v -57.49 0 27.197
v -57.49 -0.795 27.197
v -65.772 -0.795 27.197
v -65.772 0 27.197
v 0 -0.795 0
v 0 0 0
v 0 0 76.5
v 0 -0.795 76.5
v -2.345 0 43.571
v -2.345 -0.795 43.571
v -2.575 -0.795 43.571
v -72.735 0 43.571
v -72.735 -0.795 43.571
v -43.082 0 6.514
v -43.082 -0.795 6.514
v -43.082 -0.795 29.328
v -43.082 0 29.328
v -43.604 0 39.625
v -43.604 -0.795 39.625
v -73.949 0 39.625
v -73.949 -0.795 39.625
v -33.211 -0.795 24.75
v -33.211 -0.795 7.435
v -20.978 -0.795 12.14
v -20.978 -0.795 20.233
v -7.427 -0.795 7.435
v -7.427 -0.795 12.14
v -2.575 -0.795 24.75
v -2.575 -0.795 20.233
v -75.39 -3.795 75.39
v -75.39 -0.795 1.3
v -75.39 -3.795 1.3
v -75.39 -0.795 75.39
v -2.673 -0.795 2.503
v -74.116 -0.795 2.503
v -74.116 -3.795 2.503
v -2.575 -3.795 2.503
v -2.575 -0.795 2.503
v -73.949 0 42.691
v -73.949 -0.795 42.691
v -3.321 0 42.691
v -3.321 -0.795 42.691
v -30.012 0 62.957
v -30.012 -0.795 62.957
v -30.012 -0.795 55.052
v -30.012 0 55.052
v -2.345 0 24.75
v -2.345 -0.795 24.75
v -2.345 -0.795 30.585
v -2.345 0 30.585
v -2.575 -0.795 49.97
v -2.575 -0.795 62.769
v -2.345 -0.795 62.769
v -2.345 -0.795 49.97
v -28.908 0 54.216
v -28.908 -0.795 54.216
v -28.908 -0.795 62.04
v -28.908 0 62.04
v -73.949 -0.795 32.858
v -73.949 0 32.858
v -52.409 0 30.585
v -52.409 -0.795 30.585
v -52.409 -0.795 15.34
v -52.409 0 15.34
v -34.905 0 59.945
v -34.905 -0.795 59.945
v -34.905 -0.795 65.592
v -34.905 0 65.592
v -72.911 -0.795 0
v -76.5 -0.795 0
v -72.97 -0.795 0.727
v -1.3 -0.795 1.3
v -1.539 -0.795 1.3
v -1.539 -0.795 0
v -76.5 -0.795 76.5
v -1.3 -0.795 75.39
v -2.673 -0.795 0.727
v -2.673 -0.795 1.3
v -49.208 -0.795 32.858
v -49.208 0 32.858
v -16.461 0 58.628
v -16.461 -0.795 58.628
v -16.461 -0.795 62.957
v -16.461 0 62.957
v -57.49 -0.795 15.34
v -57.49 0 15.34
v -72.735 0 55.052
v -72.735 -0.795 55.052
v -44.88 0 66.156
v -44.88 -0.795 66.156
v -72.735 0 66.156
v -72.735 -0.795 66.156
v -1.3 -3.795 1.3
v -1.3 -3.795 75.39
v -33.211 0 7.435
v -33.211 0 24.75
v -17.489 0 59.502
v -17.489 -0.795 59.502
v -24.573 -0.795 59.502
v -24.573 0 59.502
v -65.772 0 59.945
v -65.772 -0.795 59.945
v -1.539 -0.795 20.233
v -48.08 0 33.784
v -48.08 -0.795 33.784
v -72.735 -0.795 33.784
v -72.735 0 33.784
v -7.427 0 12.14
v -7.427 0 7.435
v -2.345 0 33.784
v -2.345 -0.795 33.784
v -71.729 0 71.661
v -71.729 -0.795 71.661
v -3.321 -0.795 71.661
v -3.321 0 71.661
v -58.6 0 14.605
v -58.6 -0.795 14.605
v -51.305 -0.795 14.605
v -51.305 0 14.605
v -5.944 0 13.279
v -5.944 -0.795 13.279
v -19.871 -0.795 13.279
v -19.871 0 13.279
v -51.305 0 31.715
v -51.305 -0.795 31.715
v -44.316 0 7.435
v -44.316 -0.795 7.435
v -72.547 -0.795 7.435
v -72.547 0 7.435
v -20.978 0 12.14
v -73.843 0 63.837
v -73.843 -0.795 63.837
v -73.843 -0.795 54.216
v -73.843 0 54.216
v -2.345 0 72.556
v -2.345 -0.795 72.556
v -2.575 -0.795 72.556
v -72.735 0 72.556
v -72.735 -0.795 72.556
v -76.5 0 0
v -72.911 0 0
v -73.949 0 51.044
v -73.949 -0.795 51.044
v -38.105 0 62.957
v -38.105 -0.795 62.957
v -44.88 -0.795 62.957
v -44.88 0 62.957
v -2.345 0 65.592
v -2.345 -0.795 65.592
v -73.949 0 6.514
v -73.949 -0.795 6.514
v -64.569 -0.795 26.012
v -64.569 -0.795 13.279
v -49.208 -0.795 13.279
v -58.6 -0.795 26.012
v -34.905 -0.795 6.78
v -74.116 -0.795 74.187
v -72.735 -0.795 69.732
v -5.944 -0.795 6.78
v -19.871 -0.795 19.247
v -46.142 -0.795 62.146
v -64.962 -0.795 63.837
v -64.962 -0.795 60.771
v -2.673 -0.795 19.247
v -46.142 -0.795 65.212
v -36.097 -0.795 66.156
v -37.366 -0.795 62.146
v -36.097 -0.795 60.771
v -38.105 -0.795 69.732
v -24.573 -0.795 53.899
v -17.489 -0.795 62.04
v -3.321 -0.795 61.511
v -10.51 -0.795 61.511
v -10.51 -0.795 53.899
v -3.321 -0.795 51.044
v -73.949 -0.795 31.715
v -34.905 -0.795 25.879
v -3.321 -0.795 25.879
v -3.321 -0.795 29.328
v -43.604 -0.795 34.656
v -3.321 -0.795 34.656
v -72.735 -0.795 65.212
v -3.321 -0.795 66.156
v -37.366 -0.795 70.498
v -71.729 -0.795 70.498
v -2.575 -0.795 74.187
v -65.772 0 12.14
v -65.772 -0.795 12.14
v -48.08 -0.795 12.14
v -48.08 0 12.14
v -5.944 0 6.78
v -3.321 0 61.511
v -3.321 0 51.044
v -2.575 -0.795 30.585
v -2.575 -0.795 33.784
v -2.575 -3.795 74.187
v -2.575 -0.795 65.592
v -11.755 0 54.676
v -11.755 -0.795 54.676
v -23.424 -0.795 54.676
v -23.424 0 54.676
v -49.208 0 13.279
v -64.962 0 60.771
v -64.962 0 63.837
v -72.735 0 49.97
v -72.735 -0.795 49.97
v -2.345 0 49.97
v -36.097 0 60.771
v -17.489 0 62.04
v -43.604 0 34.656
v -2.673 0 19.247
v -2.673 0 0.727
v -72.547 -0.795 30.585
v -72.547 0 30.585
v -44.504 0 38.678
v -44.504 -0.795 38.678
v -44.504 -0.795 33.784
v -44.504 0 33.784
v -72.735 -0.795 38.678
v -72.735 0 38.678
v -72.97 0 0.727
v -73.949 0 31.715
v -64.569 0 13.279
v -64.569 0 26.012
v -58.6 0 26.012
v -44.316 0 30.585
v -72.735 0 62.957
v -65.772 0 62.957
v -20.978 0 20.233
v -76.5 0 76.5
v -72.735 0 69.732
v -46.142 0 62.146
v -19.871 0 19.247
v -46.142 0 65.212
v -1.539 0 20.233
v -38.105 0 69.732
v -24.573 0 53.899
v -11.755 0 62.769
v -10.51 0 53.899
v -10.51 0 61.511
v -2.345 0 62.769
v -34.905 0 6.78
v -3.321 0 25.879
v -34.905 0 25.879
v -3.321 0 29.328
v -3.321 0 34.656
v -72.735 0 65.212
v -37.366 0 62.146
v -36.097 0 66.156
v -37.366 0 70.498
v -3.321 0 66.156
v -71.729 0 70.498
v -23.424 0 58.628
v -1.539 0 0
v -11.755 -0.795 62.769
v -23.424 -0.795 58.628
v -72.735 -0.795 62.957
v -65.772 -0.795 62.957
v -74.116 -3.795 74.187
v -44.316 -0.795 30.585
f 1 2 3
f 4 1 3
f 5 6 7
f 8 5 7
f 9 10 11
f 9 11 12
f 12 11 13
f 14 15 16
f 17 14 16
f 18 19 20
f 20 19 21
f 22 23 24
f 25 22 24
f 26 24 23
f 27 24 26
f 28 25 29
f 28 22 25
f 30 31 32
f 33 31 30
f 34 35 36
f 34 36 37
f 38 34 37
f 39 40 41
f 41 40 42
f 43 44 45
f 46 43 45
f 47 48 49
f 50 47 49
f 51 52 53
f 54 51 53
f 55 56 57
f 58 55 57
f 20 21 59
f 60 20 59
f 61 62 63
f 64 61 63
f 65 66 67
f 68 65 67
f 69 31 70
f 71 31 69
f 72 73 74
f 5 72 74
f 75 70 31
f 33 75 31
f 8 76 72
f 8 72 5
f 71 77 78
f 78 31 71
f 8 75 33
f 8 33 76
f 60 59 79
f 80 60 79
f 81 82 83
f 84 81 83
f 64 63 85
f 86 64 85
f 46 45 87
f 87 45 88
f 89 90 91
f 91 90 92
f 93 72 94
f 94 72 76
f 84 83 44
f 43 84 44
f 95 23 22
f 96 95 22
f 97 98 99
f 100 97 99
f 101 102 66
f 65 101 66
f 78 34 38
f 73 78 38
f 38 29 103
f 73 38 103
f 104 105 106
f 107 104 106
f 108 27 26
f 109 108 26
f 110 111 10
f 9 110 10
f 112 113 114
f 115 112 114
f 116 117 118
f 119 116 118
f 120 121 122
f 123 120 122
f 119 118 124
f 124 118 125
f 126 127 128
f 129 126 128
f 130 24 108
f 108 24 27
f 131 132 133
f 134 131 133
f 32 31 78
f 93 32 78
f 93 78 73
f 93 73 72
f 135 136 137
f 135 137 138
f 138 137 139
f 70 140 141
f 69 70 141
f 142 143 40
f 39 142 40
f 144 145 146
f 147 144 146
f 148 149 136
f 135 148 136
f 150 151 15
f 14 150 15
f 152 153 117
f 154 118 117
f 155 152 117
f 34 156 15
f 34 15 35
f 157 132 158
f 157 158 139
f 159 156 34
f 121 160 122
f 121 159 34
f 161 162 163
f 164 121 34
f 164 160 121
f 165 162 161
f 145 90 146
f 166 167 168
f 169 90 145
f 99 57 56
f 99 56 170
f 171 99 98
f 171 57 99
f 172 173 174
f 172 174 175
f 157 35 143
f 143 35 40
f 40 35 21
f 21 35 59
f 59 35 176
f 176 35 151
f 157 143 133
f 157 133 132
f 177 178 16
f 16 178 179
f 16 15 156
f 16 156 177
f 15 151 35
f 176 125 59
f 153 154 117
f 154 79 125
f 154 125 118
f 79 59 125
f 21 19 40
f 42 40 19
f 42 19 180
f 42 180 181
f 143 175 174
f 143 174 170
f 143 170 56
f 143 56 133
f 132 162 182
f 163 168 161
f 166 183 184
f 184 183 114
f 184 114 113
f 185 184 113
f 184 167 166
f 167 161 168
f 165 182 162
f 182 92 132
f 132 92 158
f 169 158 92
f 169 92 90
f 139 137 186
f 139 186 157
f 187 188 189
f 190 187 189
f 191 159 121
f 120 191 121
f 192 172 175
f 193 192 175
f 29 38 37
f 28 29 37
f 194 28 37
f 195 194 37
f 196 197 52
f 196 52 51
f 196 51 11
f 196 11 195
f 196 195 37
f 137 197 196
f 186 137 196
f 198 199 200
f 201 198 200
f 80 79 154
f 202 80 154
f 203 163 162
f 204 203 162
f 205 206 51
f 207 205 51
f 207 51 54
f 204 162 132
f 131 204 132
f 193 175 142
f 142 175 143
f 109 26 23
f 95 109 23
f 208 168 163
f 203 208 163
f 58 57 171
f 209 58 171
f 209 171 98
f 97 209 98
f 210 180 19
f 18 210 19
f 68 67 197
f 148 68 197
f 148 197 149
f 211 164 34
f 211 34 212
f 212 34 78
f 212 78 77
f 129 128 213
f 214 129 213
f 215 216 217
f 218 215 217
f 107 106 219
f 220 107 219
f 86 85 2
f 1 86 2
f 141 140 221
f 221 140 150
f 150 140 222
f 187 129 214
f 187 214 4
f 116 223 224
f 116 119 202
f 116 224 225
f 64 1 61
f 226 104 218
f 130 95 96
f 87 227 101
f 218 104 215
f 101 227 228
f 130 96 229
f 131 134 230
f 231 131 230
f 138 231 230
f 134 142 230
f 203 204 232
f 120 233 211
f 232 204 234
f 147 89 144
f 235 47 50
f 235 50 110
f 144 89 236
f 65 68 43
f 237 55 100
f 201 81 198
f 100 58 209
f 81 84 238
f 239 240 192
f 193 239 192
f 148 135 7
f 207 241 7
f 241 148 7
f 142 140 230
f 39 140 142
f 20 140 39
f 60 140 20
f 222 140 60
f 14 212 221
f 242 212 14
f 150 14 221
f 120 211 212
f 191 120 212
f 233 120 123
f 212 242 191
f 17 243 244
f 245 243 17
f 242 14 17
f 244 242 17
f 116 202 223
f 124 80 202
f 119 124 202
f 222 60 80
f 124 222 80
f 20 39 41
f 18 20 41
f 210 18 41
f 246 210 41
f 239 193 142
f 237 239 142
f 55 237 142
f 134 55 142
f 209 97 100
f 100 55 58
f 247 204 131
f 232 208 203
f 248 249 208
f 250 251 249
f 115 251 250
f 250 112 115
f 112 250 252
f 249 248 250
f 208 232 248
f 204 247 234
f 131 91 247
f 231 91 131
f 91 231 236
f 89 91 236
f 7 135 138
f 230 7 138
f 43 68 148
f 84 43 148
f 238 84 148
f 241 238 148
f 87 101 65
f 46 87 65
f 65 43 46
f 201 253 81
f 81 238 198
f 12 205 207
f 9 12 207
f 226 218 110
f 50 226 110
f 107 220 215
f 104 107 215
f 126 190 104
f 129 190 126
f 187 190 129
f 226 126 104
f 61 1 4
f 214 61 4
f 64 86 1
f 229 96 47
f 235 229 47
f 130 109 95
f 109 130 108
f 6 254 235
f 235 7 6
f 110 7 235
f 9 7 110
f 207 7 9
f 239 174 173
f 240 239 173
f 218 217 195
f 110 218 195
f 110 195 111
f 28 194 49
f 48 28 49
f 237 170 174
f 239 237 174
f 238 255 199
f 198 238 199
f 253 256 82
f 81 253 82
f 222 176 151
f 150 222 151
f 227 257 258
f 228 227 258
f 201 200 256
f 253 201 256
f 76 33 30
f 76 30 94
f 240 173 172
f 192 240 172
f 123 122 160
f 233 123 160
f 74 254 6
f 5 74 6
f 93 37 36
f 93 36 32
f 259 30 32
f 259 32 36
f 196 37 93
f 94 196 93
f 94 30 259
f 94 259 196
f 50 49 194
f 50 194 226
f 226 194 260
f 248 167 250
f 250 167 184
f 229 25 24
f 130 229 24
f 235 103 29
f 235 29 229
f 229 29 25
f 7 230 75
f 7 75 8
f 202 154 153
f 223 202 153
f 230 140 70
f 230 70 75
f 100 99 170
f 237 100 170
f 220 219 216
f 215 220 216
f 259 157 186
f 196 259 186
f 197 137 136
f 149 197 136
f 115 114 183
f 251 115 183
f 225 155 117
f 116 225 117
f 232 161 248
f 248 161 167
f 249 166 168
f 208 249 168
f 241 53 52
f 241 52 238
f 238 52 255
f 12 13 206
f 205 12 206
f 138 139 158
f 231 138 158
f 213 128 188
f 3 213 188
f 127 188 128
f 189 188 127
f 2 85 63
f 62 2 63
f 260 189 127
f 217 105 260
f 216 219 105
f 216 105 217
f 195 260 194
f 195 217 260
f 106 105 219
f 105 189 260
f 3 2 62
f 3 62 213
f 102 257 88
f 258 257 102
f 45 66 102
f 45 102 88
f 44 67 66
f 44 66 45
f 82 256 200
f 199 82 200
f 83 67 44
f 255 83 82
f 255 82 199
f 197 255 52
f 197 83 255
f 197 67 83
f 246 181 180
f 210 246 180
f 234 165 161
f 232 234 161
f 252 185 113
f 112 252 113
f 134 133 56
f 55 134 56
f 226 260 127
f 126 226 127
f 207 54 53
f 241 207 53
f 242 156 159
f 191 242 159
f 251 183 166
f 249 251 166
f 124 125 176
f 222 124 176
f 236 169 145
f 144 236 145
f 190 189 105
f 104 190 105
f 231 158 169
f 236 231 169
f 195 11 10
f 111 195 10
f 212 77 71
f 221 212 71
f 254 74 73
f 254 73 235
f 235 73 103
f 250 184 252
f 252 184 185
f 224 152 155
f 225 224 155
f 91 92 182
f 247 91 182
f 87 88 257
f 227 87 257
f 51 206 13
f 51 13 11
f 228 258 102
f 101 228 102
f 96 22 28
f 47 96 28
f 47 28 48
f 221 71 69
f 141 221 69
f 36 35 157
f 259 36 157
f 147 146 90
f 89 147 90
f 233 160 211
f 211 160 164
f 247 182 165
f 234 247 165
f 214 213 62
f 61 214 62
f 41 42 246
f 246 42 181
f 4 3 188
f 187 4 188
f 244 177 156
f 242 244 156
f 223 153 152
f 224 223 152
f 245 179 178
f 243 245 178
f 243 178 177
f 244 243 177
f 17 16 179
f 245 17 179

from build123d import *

# Parameters (mm, degrees)
F0_W     = 76.5
F0_H     = 76.5
F1_DEPTH = 0.795
F2_W     = 74.09
F2_H     = 74.09
F2_W_2   = 71.541
F2_H_2   = 71.684
F3_DEPTH = 3
F5_DEPTH = 0.795


with BuildPart() as f1:
    # F0 (on Front) → F1 (new body)
    with BuildSketch(Plane.XZ):
        with Locations((-38.25, 38.25)):
            Rectangle(F0_W, F0_H)
    extrude(amount=F1_DEPTH)

    # F2 (on face) → F3 (join)
    with BuildSketch(Plane.XZ.offset(0.795)):
        with Locations((-38.345, 38.345)):
            Rectangle(F2_W, F2_H)
        with Locations((-38.345, 38.345)):
            Rectangle(F2_W_2, F2_H_2, mode=Mode.SUBTRACT)
    extrude(amount=F3_DEPTH)

    # F4 (on face) → F5 (cut)
    with BuildSketch(Plane.XZ.offset(0.795)):
        Polygon((-72.97042, 0.726517), (-72.870188, -0.4949), (-1.538745, -0.4949), (-1.538745, 20.233245), (-20.977661, 20.233245), (-20.977661, 12.14023), (-7.426569, 12.14023), (-7.426569, 7.43499), (-33.211284, 7.43499), (-33.211284, 24.750275), (-2.344909, 24.750275), (-2.344909, 30.584774), (-44.315651, 30.584774), (-44.315651, 7.43499), (-72.547097, 7.43499), (-72.547097, 30.584774), (-52.408666, 30.584774), (-52.408666, 15.339793), (-57.490327, 15.339793), (-57.490327, 27.197001), (-65.771547, 27.197001), (-65.771547, 12.14023), (-48.079845, 12.14023), (-48.079845, 33.784337), (-72.735306, 33.784337), (-72.735306, 38.677789), (-44.503864, 38.677789), (-44.503864, 33.784337), (-2.344909, 33.784337), (-2.344909, 43.571237), (-72.735306, 43.571237), (-72.735306, 49.970365), (-2.344909, 49.970365), (-2.344909, 62.768615), (-11.75539, 62.768615), (-11.75539, 54.675604), (-23.424385, 54.675604), (-23.424385, 58.628007), (-16.46063, 58.628007), (-16.46063, 62.956824), (-30.011721, 62.956824), (-30.011721, 55.052026), (-72.735306, 55.052026), (-72.735306, 62.956824), (-65.771547, 62.956824), (-65.771547, 59.945471), (-34.905173, 59.945471), (-34.905173, 65.591767), (-2.344909, 65.591767), (-2.344909, 72.555519), (-72.735306, 72.555519), (-72.735306, 69.732375), (-38.104736, 69.732375), (-38.104736, 62.956824), (-44.880282, 62.956824), (-44.880282, 66.156394), (-72.735306, 66.156394), (-72.735306, 65.211832), (-46.141766, 65.211832), (-46.141766, 62.145642), (-37.366107, 62.145642), (-37.366107, 70.498376), (-71.728628, 70.498376), (-71.728628, 71.661412), (-3.320788, 71.661412), (-3.320788, 66.156394), (-36.097341, 66.156394), (-36.097341, 60.77114), (-64.961855, 60.77114), (-64.961855, 63.837334), (-73.843245, 63.837334), (-73.843245, 54.215829), (-28.907644, 54.215829), (-28.907644, 62.039911), (-17.488717, 62.039911), (-17.488717, 59.50237), (-24.57268, 59.50237), (-24.57268, 53.898636), (-10.510482, 53.898636), (-10.510482, 61.511255), (-3.320788, 61.511255), (-3.320788, 51.043905), (-73.948969, 51.043905), (-73.948969, 42.69117), (-3.320788, 42.69117), (-3.320788, 34.65563), (-43.604229, 34.65563), (-43.604229, 39.624977), (-73.948969, 39.624977), (-73.948969, 32.858203), (-49.20796, 32.858203), (-49.20796, 13.278713), (-64.569082, 13.278713), (-64.569082, 26.011829), (-58.600437, 26.011829), (-58.600437, 14.605078), (-51.305421, 14.605078), (-51.305421, 31.715206), (-73.948969, 31.715206), (-73.948969, 6.514244), (-43.081951, 6.514244), (-43.081951, 29.327746), (-3.320788, 29.327746), (-3.320788, 25.879192), (-34.905173, 25.879192), (-34.905173, 6.779518), (-5.943694, 6.779518), (-5.943694, 13.278713), (-19.87054, 13.278713), (-19.87054, 19.247362), (-2.673007, 19.247362), (-2.673007, 0.726517), align=None)
    extrude(amount=-F5_DEPTH, mode=Mode.SUBTRACT)


solid = f1.part
